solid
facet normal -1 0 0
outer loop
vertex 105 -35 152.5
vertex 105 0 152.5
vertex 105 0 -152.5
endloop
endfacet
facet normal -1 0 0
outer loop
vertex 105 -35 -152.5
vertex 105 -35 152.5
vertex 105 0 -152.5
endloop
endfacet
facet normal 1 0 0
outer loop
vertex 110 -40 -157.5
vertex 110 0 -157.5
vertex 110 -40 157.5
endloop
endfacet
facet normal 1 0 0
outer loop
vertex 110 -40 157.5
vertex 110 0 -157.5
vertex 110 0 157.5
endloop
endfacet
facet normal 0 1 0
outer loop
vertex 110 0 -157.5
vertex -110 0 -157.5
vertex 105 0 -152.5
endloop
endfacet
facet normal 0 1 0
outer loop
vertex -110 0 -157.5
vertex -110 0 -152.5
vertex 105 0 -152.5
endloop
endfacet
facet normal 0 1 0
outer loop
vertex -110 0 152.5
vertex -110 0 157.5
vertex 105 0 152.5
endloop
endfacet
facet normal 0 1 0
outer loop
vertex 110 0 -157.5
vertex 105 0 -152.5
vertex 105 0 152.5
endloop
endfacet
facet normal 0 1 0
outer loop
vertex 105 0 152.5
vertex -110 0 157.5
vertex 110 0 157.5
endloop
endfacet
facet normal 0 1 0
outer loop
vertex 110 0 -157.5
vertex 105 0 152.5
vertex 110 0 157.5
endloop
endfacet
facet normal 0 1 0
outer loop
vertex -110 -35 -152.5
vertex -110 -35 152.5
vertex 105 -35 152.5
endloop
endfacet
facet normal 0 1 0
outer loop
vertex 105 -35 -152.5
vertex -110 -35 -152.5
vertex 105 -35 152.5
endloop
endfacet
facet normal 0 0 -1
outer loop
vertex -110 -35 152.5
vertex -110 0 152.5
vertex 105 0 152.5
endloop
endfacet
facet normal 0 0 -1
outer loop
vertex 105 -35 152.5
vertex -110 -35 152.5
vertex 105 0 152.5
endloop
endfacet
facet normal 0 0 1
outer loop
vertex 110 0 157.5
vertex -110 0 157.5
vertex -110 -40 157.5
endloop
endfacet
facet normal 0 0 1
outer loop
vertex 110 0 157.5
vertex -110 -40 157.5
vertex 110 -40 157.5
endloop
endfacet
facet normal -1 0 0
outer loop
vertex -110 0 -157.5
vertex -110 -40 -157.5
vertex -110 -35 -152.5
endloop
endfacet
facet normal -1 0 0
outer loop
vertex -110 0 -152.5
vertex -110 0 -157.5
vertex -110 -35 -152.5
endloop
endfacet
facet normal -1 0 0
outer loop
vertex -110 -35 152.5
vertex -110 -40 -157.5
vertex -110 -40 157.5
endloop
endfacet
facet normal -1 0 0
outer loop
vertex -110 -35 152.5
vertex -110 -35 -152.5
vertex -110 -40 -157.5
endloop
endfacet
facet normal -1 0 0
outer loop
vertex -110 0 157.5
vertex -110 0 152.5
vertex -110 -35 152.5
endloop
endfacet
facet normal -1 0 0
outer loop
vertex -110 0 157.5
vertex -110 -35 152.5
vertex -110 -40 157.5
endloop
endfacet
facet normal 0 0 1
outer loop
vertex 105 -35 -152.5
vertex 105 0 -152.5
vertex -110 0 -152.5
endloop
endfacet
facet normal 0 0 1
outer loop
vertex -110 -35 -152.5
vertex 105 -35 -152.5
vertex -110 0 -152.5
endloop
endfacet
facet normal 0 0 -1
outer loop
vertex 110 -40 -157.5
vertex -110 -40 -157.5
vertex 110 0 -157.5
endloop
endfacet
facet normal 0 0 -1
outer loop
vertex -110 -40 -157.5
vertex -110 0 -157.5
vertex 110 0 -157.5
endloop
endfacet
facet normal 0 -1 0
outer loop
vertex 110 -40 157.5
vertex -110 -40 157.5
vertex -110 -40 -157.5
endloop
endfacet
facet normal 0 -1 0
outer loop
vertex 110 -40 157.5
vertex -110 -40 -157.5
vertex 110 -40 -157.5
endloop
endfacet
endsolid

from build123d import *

# Parameters (mm, degrees)
F1_DEPTH = 35
F2_W     = 220
F2_H     = 315
F3_DEPTH = 5


with BuildPart() as f1:
    # F0 (on Front) → F1 (new body)
    with BuildSketch(Plane.XZ):
        Polygon((-110, -157.5), (110, -157.5), (110, 157.5), (-110, 157.5), (-110, 152.500004), (105.000004, 152.500004), (105.000004, -152.500004), (-110, -152.500004), align=None)
    extrude(amount=F1_DEPTH)

    # F2 (on face) → F3 (join)
    with BuildSketch(Plane.XZ.offset(35)):
        Rectangle(F2_W, F2_H)
    extrude(amount=F3_DEPTH)


solid = f1.part
